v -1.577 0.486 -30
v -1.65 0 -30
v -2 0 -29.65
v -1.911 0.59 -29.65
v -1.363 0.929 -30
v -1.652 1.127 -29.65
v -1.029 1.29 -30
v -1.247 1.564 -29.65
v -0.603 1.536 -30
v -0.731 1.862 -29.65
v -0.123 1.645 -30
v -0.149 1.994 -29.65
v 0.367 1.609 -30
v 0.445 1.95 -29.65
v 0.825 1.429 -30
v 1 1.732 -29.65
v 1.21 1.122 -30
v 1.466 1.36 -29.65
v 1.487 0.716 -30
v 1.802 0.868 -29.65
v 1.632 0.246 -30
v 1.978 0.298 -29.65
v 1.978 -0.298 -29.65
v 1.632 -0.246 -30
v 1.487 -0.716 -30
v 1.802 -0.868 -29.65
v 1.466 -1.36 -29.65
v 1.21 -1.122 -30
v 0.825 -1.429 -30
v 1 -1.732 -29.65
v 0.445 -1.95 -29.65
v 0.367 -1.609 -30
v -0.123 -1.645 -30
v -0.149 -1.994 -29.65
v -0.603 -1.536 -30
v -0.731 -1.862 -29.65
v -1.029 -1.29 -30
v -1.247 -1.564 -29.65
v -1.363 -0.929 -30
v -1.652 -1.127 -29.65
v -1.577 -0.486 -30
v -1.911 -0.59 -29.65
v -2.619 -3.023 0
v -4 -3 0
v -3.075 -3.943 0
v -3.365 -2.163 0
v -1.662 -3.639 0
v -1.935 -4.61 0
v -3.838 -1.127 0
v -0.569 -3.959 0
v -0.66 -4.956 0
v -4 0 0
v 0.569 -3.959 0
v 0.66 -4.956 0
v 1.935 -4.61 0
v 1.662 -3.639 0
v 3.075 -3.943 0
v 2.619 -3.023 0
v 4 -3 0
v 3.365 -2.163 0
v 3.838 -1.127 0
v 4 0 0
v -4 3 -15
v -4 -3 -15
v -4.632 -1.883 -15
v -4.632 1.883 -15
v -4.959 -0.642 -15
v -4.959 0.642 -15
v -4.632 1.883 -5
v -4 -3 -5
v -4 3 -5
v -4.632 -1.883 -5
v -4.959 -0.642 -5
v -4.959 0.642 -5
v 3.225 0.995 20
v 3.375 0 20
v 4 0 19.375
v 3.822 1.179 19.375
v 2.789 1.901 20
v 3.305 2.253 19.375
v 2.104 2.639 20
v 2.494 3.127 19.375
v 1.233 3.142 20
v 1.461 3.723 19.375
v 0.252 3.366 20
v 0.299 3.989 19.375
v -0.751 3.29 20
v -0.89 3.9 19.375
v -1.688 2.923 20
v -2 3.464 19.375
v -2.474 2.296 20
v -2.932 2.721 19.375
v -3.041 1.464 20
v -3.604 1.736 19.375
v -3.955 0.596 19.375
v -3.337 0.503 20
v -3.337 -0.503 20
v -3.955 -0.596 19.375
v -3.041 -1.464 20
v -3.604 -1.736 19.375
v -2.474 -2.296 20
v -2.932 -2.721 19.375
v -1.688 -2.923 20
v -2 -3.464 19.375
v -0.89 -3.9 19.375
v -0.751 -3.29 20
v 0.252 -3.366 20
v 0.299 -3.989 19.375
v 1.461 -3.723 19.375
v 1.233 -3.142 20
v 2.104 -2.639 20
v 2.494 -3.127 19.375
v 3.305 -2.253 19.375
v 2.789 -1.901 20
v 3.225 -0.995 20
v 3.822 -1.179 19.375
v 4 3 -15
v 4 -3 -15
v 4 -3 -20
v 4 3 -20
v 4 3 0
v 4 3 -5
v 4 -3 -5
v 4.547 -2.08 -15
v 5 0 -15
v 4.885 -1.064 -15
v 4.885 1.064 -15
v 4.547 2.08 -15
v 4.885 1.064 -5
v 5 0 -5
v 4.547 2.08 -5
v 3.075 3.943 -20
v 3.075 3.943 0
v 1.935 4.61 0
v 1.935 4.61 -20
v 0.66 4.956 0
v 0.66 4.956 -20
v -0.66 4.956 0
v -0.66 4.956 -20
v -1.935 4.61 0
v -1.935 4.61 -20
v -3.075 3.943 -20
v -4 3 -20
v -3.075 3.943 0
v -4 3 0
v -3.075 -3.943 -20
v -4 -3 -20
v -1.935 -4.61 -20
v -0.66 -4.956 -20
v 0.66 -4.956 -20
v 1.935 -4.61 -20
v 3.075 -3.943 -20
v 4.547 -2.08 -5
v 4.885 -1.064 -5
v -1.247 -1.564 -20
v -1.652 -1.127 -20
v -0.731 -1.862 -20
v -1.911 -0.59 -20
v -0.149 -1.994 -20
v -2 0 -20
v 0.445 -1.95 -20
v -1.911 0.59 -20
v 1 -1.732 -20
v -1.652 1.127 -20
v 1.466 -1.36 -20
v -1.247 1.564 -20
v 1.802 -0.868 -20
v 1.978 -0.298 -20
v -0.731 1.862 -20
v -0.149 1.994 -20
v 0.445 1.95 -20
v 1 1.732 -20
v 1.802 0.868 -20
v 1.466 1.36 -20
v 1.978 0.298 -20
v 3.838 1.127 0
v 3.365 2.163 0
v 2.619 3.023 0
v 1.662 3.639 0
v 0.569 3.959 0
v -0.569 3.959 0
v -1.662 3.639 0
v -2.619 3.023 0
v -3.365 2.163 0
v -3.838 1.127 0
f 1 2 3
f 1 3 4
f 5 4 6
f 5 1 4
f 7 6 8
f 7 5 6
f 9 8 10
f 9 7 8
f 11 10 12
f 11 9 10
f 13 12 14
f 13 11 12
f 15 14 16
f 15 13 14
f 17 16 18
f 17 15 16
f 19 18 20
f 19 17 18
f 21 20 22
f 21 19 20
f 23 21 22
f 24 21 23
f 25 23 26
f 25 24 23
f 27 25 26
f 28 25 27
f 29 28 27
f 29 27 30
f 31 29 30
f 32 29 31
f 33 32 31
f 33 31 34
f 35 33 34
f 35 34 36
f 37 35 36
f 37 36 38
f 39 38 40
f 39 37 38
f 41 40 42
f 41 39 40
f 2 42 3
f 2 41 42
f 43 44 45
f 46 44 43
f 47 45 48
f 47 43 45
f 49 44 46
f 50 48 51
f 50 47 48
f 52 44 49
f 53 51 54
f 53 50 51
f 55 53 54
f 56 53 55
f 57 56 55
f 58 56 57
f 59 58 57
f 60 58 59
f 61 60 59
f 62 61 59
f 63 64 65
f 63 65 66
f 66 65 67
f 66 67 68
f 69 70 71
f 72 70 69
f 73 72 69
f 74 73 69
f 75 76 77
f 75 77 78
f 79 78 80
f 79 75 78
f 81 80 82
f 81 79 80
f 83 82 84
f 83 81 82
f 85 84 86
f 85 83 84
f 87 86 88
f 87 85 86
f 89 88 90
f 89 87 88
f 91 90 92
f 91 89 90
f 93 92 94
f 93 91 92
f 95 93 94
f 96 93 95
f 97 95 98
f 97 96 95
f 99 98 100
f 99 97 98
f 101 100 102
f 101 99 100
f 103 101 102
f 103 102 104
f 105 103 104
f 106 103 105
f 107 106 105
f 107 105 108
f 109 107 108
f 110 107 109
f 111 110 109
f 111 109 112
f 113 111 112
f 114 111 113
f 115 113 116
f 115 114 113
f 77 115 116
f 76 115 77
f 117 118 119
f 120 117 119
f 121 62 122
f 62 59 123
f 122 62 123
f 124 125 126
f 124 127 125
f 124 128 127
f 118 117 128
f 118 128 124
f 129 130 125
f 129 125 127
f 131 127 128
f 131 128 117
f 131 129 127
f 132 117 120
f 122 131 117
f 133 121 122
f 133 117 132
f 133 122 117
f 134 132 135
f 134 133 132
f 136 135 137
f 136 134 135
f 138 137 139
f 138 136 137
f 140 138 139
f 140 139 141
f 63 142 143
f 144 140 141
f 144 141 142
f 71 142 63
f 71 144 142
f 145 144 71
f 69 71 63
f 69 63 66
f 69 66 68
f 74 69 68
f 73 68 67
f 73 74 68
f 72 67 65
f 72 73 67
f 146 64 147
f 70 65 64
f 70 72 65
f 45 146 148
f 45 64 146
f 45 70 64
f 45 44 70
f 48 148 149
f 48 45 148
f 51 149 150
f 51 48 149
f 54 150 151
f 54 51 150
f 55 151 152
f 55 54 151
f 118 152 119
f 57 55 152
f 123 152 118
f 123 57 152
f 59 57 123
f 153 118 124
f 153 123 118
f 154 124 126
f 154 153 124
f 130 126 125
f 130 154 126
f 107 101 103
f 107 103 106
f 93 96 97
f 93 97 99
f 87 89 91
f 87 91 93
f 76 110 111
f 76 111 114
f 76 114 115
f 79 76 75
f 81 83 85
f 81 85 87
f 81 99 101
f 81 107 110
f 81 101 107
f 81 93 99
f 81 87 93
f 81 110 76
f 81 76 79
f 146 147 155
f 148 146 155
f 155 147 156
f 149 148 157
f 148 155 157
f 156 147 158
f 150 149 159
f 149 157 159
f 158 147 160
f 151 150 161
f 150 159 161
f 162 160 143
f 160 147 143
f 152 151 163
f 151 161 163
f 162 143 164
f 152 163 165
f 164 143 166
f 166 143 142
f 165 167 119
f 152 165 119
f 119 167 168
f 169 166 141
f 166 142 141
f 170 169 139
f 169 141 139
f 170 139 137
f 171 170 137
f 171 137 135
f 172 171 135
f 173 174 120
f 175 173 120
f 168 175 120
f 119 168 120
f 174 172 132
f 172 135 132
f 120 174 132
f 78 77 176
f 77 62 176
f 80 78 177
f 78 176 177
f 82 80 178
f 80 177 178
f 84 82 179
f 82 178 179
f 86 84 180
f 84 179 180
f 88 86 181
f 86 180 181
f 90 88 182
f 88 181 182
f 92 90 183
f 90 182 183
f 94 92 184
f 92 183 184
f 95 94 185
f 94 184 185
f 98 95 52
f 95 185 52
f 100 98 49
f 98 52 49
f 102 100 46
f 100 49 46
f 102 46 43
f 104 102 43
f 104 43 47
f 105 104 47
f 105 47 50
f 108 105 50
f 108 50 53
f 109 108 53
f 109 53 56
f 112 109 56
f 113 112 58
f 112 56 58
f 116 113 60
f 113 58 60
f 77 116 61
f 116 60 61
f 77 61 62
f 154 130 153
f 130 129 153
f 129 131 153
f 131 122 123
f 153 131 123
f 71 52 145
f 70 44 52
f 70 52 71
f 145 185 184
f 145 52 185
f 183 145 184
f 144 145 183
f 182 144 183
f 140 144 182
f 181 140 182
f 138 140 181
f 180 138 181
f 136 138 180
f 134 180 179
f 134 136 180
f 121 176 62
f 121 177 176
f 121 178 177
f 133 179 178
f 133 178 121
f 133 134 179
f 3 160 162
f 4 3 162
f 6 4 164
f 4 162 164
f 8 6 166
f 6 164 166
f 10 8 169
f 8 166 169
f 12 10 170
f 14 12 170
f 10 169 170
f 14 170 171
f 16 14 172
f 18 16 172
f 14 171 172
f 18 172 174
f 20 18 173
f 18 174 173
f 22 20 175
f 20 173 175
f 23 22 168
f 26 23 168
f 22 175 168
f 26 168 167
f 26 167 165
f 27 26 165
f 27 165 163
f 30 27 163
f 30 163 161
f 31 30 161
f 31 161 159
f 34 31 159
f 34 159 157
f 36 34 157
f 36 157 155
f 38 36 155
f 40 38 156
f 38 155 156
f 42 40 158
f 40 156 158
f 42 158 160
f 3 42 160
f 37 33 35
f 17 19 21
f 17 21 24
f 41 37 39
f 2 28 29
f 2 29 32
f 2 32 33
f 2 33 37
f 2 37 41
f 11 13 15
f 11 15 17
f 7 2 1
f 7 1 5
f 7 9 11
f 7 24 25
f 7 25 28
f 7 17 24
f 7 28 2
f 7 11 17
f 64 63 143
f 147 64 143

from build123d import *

# Parameters (mm, degrees)
ESBO_O2_R                  = 5
RESSALTO_EXTRUS_O1_DEPTH   = 20
ESBO_O3_R                  = 4
RESSALTO_EXTRUS_O2_DEPTH   = 20
ESBO_O4_R                  = 2
RESSALTO_EXTRUS_O3_DEPTH   = 10
CHANFRO1_SIZE              = 0.625
CHANFRO2_SIZE              = 0.35
CORTE_EXTRUS_O2_DEPTH      = 31.822070015
CORTE_EXTRUS_O2_DEPTH_BACK = 31.822070015
ESBO_O6_W                  = 1
ESBO_O6_H                  = 5


with BuildPart() as part:
    # Esboço2 → Ressalto-extrusão1 (new body)
    with BuildSketch(Plane.XY):
        Circle(ESBO_O2_R)
    extrude(amount=-RESSALTO_EXTRUS_O1_DEPTH)

    # Esboço3 → Ressalto-extrusão2 (add)
    with BuildSketch(Plane.XY):
        Circle(ESBO_O3_R)
    extrude(amount=RESSALTO_EXTRUS_O2_DEPTH)

    # Esboço4 → Ressalto-extrusão3 (add)
    with BuildSketch(Plane(origin=(0, 0, -20), x_dir=(-1, 0, 0), z_dir=(0, 0, -1))):
        Circle(ESBO_O4_R)
    extrude(amount=RESSALTO_EXTRUS_O3_DEPTH)

    # Chanfro1
    chanfro1_edges = [part.edges().sort_by_distance(p)[0] for p in [
        (-4, 0, 20),
    ]]
    chamfer(chanfro1_edges, length=CHANFRO1_SIZE)

    # Chanfro2
    chanfro2_edges = [part.edges().sort_by_distance(p)[0] for p in [
        (2, 0, -30),
    ]]
    chamfer(chanfro2_edges, length=CHANFRO2_SIZE)

    # Esboço6 → Corte-extrusão2 (cut, two sides: drawn at the far end of the back side and taken through both)
    with BuildSketch(Plane(origin=(0, 0, 0), x_dir=(1, 0, 0), z_dir=(0, 1, 0)).offset(-CORTE_EXTRUS_O2_DEPTH_BACK)):
        with Locations((-4.5, 17.5)):
            Rectangle(ESBO_O6_W, ESBO_O6_H)
        with Locations((-4.5, 2.5)):
            Rectangle(ESBO_O6_W, ESBO_O6_H)
        with Locations((4.5, 17.5)):
            Rectangle(ESBO_O6_W, ESBO_O6_H)
        with Locations((4.5, 2.5)):
            Rectangle(ESBO_O6_W, ESBO_O6_H)
    extrude(amount=CORTE_EXTRUS_O2_DEPTH + CORTE_EXTRUS_O2_DEPTH_BACK, mode=Mode.SUBTRACT)


solid = part.part
